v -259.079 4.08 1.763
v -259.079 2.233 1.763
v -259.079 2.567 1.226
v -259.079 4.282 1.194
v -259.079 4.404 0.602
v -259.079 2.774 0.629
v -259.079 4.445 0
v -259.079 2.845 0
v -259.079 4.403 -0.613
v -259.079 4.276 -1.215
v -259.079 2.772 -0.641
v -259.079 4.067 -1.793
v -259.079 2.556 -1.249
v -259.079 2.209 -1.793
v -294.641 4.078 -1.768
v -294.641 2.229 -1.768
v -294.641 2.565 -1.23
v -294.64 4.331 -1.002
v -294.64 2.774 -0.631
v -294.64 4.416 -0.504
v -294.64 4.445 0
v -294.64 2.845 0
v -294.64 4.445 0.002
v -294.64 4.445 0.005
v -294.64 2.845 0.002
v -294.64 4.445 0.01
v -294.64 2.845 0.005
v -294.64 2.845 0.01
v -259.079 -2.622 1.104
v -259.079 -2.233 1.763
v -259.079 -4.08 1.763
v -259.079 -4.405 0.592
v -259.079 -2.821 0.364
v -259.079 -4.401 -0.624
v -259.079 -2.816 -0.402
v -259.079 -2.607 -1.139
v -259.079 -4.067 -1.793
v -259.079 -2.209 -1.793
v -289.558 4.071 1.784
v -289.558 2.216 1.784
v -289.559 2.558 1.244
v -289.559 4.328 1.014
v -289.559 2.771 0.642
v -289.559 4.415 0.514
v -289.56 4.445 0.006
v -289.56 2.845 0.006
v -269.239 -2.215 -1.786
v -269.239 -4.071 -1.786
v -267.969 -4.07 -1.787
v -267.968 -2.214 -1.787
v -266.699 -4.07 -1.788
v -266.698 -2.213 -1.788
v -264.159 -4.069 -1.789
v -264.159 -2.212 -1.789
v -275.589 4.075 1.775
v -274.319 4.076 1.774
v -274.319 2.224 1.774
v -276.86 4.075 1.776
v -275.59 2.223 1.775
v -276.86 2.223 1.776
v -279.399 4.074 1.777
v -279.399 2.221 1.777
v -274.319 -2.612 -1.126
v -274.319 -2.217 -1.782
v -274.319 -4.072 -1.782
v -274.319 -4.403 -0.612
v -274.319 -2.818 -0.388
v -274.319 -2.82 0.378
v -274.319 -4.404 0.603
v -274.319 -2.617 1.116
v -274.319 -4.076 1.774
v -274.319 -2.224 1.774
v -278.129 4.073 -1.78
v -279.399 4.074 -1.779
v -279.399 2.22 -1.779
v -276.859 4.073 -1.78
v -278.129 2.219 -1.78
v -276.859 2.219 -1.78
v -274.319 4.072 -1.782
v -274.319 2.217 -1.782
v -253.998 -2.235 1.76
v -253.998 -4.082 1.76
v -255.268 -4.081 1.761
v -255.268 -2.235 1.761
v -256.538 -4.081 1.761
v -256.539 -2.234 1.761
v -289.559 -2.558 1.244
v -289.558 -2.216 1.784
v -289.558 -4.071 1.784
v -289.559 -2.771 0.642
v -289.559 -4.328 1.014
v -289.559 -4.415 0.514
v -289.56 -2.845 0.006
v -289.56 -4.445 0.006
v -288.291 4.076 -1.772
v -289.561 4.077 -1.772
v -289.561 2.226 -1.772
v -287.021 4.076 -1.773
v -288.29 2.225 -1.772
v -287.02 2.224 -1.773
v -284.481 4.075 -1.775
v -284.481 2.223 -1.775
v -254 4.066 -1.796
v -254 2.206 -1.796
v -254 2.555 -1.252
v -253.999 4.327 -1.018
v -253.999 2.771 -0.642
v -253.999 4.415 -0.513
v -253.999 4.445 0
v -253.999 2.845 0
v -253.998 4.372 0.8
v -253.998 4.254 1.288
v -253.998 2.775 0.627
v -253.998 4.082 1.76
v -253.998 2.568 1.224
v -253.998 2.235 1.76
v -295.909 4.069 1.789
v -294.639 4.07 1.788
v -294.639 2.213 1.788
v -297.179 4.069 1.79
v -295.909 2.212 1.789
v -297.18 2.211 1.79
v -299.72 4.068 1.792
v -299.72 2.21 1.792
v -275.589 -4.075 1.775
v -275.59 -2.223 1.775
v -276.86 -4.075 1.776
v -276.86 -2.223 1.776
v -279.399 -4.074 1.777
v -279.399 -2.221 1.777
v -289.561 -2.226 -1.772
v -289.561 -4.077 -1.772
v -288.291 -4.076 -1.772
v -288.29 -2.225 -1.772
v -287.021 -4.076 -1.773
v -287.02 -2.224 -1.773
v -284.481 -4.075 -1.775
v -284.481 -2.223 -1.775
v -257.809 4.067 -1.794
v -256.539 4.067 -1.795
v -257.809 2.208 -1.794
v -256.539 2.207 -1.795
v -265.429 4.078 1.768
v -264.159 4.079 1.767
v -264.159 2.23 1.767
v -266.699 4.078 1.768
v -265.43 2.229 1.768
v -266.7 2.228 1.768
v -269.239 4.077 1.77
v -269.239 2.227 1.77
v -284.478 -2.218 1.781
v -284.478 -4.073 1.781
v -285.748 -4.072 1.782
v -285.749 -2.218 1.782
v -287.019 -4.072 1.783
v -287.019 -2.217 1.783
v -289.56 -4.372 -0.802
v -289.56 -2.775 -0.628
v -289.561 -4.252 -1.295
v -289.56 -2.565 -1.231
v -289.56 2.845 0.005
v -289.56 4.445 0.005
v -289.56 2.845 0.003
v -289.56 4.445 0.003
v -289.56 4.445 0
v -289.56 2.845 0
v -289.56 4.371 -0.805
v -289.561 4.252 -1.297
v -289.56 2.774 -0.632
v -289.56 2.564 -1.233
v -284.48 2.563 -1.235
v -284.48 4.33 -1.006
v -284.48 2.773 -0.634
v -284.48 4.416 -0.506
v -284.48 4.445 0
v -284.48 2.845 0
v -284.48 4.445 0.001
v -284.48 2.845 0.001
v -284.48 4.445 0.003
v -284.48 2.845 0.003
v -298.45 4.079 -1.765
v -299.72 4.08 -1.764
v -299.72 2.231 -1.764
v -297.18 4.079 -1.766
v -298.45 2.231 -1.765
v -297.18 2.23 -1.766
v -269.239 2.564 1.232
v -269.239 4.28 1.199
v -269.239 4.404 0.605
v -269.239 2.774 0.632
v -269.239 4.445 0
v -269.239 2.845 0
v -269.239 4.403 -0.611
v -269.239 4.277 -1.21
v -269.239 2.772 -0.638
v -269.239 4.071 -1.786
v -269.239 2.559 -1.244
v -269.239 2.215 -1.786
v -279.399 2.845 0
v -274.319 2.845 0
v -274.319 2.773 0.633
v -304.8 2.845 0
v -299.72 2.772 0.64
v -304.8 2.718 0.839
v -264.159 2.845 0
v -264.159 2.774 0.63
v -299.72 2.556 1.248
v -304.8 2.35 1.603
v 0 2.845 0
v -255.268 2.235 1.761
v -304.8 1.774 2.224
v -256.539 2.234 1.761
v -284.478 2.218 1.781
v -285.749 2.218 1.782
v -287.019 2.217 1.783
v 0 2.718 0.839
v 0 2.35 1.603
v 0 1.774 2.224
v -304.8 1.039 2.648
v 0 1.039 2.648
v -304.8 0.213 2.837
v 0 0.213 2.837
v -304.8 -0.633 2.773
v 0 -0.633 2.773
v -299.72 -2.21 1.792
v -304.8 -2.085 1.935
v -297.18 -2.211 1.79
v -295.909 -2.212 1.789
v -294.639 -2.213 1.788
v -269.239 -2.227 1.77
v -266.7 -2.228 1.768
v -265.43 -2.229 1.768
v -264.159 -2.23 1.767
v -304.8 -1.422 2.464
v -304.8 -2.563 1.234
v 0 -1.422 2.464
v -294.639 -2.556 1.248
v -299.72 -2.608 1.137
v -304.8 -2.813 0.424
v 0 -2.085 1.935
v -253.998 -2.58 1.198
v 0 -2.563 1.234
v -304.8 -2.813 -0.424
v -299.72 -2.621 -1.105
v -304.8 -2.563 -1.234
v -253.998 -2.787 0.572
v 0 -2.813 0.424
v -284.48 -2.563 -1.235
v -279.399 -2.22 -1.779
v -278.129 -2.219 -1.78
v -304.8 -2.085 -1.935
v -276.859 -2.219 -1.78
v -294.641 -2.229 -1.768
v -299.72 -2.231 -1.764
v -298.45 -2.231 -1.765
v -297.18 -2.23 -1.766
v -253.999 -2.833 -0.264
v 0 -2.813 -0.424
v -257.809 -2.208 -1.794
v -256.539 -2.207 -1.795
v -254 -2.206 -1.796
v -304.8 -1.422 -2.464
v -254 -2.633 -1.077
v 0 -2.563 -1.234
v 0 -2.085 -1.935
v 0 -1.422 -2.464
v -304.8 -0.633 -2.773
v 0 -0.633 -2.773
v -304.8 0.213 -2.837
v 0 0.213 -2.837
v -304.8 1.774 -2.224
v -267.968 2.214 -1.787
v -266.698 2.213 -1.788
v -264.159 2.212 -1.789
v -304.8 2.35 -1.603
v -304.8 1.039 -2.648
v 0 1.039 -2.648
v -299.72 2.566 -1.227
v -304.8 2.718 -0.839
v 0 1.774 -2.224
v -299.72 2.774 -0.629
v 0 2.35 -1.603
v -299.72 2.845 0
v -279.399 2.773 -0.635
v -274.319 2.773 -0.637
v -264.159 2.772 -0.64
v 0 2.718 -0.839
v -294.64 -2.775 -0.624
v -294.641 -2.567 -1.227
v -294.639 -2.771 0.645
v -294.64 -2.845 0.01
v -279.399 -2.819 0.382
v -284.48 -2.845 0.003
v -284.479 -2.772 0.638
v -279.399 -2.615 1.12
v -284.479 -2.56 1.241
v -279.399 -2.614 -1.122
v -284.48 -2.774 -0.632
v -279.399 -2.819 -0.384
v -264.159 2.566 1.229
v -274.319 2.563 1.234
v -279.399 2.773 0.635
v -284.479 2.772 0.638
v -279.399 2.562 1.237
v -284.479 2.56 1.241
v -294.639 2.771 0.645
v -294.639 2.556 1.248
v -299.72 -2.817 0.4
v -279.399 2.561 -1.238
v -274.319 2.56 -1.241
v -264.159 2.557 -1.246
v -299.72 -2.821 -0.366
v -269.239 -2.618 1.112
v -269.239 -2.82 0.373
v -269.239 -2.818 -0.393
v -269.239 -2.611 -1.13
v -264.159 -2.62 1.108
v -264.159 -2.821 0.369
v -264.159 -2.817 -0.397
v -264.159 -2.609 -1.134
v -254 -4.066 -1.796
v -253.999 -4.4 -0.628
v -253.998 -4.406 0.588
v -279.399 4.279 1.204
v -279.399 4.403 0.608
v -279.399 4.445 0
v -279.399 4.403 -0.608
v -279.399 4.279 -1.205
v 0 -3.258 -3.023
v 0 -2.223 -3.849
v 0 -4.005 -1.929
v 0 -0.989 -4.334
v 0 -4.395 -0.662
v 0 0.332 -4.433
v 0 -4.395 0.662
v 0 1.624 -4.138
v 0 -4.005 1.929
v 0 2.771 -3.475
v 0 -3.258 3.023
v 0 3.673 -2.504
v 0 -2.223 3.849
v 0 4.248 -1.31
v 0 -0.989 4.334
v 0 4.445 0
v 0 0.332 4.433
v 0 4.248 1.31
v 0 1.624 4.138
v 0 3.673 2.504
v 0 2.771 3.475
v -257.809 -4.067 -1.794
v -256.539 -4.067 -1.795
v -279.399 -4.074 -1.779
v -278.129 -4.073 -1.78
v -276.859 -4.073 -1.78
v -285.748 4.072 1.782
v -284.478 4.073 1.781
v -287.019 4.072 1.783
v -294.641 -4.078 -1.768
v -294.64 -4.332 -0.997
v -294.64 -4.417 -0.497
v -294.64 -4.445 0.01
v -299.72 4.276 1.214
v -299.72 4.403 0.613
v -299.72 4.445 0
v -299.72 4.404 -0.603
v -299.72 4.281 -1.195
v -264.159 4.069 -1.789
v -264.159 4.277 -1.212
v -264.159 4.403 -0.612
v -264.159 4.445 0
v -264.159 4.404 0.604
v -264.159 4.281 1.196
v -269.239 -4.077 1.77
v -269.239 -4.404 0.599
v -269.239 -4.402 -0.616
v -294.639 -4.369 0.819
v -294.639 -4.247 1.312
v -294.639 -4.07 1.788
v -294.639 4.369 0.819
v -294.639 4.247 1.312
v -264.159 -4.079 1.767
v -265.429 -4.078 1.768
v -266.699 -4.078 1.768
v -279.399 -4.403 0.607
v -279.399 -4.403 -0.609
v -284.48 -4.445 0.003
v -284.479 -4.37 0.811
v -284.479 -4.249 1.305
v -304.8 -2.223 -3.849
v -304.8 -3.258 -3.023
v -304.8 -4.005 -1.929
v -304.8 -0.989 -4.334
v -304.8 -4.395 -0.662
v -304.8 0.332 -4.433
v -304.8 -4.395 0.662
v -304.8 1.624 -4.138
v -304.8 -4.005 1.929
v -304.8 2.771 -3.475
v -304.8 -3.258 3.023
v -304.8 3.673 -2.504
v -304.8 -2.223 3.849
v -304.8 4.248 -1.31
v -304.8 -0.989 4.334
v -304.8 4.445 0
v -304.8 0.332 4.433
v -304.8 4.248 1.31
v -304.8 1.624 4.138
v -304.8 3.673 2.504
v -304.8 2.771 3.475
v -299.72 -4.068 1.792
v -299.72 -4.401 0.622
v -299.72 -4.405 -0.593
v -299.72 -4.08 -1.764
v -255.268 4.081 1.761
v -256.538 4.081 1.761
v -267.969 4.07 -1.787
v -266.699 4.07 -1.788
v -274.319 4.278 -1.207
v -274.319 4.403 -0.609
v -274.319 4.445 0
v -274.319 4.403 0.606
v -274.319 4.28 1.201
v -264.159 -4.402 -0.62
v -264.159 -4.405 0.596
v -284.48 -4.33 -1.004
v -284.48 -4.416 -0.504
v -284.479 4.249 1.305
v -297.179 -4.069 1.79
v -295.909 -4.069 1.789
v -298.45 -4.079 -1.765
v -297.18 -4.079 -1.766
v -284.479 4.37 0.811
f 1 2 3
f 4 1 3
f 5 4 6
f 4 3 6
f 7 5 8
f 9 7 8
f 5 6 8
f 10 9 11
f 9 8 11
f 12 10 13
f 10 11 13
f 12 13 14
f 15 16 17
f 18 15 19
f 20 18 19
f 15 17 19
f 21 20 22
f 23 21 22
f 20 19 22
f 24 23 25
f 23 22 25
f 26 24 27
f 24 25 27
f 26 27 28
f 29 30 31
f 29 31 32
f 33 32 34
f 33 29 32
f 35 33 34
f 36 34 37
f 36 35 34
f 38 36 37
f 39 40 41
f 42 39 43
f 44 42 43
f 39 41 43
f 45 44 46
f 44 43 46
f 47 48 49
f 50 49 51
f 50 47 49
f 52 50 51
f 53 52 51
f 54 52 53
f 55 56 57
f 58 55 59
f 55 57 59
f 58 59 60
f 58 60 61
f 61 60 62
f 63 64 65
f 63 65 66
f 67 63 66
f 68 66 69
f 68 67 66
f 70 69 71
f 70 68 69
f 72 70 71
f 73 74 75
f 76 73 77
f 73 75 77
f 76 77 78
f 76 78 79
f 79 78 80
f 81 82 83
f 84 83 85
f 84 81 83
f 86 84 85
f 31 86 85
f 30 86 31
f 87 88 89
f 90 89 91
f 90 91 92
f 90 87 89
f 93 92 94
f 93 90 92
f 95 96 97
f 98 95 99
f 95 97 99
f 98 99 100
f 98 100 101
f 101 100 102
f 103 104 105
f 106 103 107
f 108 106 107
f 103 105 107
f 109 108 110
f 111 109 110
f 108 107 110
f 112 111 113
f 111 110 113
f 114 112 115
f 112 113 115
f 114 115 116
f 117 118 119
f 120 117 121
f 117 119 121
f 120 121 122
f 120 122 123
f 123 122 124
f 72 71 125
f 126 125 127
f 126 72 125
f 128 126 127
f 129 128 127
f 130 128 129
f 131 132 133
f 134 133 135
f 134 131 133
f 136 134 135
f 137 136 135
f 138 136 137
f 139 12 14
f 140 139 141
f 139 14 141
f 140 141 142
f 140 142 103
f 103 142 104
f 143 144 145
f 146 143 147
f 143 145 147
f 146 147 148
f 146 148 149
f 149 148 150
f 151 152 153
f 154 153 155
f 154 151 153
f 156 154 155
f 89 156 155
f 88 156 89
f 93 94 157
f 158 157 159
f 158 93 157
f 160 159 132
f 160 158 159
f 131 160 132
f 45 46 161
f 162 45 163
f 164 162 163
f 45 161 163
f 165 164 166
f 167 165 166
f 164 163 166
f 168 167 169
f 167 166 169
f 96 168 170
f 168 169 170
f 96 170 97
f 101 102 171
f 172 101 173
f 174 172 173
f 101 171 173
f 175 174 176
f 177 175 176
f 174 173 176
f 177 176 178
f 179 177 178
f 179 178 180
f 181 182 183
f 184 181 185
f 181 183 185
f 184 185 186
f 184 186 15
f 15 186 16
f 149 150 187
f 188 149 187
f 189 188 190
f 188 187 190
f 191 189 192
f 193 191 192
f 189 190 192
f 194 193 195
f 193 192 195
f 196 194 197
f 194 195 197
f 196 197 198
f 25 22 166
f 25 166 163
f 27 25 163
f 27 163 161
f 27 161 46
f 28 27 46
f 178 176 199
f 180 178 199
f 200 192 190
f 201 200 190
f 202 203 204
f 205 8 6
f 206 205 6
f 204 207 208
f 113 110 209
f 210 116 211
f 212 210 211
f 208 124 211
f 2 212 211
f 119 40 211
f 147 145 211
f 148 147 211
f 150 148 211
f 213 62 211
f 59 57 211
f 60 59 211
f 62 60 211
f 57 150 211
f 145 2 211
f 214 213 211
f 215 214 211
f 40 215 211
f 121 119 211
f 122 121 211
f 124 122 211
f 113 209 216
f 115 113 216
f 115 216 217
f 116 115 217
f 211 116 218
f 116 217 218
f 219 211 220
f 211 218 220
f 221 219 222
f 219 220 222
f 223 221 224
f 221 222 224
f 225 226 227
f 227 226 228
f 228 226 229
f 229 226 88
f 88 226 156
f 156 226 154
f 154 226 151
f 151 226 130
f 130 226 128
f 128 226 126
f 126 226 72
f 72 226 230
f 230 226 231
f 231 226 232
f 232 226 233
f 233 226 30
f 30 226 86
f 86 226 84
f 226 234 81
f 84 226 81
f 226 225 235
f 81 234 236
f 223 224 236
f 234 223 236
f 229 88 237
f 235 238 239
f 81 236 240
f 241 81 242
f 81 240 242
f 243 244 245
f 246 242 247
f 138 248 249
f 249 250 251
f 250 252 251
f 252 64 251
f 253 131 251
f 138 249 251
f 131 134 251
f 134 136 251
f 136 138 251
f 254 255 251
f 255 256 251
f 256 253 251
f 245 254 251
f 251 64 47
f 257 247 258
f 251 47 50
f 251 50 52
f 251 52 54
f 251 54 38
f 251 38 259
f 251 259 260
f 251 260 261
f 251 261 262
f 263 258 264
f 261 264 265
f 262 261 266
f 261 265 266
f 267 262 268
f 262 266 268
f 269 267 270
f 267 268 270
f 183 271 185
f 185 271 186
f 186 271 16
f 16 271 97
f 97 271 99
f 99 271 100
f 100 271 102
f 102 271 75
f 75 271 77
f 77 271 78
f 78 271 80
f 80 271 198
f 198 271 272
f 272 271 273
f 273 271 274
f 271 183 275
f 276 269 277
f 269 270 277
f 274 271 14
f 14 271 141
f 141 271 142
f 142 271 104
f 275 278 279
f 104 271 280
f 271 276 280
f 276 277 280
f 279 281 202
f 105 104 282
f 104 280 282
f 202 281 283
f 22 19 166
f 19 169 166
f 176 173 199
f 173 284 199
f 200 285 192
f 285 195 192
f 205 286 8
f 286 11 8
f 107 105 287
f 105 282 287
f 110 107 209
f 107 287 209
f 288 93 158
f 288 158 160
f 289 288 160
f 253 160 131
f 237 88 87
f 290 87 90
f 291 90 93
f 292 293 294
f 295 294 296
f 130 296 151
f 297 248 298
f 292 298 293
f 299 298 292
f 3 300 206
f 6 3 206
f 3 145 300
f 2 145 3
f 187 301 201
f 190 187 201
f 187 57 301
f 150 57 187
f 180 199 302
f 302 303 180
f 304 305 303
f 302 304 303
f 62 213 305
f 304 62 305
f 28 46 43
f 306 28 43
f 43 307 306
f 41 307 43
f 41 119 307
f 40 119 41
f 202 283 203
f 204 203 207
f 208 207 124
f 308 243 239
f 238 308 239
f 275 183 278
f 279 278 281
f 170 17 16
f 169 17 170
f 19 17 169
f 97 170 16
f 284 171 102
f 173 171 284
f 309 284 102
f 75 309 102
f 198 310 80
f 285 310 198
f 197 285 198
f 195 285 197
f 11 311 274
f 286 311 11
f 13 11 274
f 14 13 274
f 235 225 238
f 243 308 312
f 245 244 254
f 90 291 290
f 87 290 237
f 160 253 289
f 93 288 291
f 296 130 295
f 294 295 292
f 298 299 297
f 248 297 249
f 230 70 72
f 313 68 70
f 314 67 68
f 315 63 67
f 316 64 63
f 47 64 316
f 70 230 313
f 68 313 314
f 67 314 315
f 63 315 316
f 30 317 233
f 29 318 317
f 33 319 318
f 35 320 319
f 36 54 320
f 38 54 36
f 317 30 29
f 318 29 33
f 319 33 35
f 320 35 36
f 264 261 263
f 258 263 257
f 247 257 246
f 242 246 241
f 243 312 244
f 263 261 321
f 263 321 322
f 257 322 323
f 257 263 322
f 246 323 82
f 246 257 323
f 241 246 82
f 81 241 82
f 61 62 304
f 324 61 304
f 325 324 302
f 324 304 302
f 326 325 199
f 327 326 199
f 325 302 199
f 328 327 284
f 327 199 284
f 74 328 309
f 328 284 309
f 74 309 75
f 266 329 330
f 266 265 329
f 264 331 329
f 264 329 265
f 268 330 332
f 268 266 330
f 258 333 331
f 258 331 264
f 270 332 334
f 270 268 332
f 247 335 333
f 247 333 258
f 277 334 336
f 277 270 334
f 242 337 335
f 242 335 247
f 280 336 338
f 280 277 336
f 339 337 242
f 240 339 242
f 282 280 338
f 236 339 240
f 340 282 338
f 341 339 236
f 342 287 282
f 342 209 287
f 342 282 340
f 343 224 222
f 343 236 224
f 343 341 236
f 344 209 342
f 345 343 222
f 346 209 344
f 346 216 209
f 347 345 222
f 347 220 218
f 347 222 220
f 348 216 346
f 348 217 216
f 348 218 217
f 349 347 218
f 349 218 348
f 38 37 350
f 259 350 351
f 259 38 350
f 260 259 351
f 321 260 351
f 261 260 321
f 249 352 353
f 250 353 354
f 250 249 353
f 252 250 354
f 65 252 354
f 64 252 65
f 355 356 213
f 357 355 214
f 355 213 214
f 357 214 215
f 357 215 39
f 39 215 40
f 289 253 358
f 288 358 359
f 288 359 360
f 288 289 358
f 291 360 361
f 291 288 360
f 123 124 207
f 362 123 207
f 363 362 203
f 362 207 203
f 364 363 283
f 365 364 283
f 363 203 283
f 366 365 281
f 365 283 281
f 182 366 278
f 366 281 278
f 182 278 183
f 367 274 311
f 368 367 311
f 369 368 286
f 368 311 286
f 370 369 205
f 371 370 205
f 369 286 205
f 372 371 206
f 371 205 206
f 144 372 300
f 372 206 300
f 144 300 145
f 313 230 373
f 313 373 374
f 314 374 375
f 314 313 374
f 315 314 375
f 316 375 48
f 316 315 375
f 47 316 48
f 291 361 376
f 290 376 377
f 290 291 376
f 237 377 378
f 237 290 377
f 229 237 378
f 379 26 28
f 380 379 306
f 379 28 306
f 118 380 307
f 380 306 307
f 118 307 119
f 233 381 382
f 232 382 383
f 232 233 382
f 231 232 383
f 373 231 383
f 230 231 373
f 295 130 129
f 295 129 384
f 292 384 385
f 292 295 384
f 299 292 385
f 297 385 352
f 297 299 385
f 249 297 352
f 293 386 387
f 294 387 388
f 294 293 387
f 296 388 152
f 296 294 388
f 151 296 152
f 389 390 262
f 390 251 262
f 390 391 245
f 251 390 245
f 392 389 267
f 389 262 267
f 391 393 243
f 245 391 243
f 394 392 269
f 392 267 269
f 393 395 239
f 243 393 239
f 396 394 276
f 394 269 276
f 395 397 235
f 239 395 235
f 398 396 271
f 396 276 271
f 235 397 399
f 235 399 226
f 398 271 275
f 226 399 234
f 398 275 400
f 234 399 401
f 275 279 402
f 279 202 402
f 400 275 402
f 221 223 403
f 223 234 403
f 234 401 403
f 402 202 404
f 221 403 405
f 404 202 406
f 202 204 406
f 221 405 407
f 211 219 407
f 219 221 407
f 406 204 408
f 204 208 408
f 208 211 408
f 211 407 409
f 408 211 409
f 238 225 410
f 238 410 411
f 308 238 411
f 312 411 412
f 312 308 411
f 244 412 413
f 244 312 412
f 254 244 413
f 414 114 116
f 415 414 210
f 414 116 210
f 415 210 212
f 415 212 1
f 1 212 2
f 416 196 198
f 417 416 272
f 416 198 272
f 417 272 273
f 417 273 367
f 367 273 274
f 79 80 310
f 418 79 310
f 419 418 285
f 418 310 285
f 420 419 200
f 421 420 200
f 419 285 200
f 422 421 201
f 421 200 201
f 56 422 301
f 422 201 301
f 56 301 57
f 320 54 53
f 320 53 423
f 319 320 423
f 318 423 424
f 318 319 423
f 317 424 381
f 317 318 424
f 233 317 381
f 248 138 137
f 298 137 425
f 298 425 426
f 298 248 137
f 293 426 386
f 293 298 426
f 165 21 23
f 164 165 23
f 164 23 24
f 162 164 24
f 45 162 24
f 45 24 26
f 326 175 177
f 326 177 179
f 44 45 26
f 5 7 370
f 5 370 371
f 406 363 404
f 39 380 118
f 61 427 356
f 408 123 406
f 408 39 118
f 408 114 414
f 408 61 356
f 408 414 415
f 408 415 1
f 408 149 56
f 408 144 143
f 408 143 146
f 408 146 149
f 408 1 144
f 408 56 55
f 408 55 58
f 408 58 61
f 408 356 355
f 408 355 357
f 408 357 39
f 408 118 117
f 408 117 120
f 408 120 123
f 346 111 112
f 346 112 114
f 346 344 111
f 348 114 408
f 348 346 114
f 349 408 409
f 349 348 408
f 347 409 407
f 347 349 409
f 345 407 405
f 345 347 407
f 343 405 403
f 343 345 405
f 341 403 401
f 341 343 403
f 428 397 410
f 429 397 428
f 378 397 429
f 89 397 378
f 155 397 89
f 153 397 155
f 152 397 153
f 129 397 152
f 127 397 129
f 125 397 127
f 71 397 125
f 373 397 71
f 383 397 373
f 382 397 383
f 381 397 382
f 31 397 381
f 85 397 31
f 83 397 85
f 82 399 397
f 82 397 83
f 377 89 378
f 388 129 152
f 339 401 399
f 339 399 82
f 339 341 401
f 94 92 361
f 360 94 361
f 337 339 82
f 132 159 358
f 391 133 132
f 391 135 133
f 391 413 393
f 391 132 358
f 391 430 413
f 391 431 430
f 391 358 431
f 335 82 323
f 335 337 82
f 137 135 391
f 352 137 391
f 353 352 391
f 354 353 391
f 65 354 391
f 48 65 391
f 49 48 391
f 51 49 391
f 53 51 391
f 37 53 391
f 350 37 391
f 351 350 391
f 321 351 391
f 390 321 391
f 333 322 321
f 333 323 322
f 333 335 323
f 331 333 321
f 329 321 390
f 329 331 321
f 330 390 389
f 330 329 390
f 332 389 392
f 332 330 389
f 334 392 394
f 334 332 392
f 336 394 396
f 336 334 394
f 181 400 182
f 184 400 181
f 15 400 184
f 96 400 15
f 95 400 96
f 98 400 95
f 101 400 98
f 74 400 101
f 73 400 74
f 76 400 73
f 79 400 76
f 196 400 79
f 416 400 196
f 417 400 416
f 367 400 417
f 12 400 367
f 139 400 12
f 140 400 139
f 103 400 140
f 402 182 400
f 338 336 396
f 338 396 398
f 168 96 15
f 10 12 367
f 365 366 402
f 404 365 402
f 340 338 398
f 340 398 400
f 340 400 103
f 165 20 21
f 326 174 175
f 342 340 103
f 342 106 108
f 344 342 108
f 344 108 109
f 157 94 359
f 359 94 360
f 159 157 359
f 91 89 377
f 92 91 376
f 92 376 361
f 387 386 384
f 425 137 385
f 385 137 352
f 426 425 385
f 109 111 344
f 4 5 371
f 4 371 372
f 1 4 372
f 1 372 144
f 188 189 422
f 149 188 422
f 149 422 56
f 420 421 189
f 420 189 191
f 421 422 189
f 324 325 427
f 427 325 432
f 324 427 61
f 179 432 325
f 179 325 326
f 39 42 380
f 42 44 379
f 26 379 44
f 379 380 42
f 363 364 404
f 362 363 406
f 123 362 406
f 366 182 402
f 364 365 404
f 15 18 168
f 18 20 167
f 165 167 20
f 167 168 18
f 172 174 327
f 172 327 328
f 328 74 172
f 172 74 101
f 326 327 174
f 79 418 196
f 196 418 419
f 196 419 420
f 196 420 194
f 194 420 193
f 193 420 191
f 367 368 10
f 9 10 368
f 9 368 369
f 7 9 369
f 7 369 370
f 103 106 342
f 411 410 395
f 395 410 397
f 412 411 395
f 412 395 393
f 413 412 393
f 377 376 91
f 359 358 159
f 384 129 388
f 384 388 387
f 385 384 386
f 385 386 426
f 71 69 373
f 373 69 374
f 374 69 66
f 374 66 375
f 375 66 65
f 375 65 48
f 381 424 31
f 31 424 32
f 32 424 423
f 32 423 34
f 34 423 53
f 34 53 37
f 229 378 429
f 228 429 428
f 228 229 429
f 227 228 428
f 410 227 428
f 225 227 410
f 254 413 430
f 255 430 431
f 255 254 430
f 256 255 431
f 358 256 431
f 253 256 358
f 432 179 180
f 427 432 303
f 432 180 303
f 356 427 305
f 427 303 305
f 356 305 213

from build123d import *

# Parameters (mm, degrees)
F0_R          = 4.445
F0_R_2        = 2.8448
F1_DEPTH      = 12.7
F2_DEPTH      = 304.8
F4_DEPTH      = 25.4
F4_DEPTH_BACK = 25.4


with BuildPart() as f1:
    # F0 (on Right) → F1 (new body)
    with BuildSketch(Plane.YZ):
        Circle(F0_R)
        Circle(F0_R_2, mode=Mode.SUBTRACT)
    extrude(amount=-F1_DEPTH)

    # F0 (on Right) → F2 (join)
    with BuildSketch(Plane.YZ):
        Circle(F0_R)
        Circle(F0_R_2, mode=Mode.SUBTRACT)
    extrude(amount=-F2_DEPTH)

    # F3 (on Front) → F4 (cut, two sides)
    with BuildSketch(Plane.XZ) as f4_sk:
        Polygon((-253.9987727039, -0.0183600185), (-259.0788954335, -0.0148181376), (-259.0788954335, -1.7928185265), (-254.0000123471, -1.7963595863), align=None)
        Polygon((-259.0788954335, 1.7631822513), (-259.0788954335, -0.0148181376), (-253.9987727039, -0.0183600185), (-253.9975330607, 1.7596395494), align=None)
        Polygon((-269.2391408927, 1.7702659267), (-269.2391408927, -0.0077343758), (-264.1590181631, -0.0112762567), (-264.1590181631, 1.766724089), align=None)
        Polygon((-264.1590181631, -0.0112762567), (-269.2391408927, -0.0077343758), (-269.2391408927, -1.7857346783), (-264.1590181631, -1.7892766024), align=None)
        Polygon((-279.3993863519, 1.7773496021), (-279.3993863519, -0.000650614), (-274.3192636223, -0.0041924949), (-274.3192636223, 1.7738077644), align=None)
        Polygon((-274.3192636223, -0.0041924949), (-279.3993863519, -0.000650614), (-279.3993863519, -1.7786508301), (-274.3192636223, -1.7821927542), align=None)
        Polygon((-284.4795090815, 0.0028912669), (-289.5596318112, 0.0064331478), (-289.5608714541, -1.7715661175), (-284.4807487246, -1.7751080416), align=None)
        Polygon((-289.5583921682, 1.7844324132), (-289.5596318112, 0.0064331478), (-284.4795090815, 0.0028912669), (-284.4782694385, 1.7808905755), align=None)
        Polygon((-294.6397545408, 0.0099750287), (-299.7198772704, 0.0135169096), (-299.7198772704, -1.7644831336), (-294.6409941837, -1.7680241934), align=None)
        Polygon((-299.7198772704, 1.7915169528), (-299.7198772704, 0.0135169096), (-294.6397545408, 0.0099750287), (-294.6385148978, 1.7879742509), align=None)
    extrude(amount=-F4_DEPTH, mode=Mode.SUBTRACT)
    extrude(f4_sk.sketch, amount=F4_DEPTH_BACK, mode=Mode.SUBTRACT)


solid = f1.part
